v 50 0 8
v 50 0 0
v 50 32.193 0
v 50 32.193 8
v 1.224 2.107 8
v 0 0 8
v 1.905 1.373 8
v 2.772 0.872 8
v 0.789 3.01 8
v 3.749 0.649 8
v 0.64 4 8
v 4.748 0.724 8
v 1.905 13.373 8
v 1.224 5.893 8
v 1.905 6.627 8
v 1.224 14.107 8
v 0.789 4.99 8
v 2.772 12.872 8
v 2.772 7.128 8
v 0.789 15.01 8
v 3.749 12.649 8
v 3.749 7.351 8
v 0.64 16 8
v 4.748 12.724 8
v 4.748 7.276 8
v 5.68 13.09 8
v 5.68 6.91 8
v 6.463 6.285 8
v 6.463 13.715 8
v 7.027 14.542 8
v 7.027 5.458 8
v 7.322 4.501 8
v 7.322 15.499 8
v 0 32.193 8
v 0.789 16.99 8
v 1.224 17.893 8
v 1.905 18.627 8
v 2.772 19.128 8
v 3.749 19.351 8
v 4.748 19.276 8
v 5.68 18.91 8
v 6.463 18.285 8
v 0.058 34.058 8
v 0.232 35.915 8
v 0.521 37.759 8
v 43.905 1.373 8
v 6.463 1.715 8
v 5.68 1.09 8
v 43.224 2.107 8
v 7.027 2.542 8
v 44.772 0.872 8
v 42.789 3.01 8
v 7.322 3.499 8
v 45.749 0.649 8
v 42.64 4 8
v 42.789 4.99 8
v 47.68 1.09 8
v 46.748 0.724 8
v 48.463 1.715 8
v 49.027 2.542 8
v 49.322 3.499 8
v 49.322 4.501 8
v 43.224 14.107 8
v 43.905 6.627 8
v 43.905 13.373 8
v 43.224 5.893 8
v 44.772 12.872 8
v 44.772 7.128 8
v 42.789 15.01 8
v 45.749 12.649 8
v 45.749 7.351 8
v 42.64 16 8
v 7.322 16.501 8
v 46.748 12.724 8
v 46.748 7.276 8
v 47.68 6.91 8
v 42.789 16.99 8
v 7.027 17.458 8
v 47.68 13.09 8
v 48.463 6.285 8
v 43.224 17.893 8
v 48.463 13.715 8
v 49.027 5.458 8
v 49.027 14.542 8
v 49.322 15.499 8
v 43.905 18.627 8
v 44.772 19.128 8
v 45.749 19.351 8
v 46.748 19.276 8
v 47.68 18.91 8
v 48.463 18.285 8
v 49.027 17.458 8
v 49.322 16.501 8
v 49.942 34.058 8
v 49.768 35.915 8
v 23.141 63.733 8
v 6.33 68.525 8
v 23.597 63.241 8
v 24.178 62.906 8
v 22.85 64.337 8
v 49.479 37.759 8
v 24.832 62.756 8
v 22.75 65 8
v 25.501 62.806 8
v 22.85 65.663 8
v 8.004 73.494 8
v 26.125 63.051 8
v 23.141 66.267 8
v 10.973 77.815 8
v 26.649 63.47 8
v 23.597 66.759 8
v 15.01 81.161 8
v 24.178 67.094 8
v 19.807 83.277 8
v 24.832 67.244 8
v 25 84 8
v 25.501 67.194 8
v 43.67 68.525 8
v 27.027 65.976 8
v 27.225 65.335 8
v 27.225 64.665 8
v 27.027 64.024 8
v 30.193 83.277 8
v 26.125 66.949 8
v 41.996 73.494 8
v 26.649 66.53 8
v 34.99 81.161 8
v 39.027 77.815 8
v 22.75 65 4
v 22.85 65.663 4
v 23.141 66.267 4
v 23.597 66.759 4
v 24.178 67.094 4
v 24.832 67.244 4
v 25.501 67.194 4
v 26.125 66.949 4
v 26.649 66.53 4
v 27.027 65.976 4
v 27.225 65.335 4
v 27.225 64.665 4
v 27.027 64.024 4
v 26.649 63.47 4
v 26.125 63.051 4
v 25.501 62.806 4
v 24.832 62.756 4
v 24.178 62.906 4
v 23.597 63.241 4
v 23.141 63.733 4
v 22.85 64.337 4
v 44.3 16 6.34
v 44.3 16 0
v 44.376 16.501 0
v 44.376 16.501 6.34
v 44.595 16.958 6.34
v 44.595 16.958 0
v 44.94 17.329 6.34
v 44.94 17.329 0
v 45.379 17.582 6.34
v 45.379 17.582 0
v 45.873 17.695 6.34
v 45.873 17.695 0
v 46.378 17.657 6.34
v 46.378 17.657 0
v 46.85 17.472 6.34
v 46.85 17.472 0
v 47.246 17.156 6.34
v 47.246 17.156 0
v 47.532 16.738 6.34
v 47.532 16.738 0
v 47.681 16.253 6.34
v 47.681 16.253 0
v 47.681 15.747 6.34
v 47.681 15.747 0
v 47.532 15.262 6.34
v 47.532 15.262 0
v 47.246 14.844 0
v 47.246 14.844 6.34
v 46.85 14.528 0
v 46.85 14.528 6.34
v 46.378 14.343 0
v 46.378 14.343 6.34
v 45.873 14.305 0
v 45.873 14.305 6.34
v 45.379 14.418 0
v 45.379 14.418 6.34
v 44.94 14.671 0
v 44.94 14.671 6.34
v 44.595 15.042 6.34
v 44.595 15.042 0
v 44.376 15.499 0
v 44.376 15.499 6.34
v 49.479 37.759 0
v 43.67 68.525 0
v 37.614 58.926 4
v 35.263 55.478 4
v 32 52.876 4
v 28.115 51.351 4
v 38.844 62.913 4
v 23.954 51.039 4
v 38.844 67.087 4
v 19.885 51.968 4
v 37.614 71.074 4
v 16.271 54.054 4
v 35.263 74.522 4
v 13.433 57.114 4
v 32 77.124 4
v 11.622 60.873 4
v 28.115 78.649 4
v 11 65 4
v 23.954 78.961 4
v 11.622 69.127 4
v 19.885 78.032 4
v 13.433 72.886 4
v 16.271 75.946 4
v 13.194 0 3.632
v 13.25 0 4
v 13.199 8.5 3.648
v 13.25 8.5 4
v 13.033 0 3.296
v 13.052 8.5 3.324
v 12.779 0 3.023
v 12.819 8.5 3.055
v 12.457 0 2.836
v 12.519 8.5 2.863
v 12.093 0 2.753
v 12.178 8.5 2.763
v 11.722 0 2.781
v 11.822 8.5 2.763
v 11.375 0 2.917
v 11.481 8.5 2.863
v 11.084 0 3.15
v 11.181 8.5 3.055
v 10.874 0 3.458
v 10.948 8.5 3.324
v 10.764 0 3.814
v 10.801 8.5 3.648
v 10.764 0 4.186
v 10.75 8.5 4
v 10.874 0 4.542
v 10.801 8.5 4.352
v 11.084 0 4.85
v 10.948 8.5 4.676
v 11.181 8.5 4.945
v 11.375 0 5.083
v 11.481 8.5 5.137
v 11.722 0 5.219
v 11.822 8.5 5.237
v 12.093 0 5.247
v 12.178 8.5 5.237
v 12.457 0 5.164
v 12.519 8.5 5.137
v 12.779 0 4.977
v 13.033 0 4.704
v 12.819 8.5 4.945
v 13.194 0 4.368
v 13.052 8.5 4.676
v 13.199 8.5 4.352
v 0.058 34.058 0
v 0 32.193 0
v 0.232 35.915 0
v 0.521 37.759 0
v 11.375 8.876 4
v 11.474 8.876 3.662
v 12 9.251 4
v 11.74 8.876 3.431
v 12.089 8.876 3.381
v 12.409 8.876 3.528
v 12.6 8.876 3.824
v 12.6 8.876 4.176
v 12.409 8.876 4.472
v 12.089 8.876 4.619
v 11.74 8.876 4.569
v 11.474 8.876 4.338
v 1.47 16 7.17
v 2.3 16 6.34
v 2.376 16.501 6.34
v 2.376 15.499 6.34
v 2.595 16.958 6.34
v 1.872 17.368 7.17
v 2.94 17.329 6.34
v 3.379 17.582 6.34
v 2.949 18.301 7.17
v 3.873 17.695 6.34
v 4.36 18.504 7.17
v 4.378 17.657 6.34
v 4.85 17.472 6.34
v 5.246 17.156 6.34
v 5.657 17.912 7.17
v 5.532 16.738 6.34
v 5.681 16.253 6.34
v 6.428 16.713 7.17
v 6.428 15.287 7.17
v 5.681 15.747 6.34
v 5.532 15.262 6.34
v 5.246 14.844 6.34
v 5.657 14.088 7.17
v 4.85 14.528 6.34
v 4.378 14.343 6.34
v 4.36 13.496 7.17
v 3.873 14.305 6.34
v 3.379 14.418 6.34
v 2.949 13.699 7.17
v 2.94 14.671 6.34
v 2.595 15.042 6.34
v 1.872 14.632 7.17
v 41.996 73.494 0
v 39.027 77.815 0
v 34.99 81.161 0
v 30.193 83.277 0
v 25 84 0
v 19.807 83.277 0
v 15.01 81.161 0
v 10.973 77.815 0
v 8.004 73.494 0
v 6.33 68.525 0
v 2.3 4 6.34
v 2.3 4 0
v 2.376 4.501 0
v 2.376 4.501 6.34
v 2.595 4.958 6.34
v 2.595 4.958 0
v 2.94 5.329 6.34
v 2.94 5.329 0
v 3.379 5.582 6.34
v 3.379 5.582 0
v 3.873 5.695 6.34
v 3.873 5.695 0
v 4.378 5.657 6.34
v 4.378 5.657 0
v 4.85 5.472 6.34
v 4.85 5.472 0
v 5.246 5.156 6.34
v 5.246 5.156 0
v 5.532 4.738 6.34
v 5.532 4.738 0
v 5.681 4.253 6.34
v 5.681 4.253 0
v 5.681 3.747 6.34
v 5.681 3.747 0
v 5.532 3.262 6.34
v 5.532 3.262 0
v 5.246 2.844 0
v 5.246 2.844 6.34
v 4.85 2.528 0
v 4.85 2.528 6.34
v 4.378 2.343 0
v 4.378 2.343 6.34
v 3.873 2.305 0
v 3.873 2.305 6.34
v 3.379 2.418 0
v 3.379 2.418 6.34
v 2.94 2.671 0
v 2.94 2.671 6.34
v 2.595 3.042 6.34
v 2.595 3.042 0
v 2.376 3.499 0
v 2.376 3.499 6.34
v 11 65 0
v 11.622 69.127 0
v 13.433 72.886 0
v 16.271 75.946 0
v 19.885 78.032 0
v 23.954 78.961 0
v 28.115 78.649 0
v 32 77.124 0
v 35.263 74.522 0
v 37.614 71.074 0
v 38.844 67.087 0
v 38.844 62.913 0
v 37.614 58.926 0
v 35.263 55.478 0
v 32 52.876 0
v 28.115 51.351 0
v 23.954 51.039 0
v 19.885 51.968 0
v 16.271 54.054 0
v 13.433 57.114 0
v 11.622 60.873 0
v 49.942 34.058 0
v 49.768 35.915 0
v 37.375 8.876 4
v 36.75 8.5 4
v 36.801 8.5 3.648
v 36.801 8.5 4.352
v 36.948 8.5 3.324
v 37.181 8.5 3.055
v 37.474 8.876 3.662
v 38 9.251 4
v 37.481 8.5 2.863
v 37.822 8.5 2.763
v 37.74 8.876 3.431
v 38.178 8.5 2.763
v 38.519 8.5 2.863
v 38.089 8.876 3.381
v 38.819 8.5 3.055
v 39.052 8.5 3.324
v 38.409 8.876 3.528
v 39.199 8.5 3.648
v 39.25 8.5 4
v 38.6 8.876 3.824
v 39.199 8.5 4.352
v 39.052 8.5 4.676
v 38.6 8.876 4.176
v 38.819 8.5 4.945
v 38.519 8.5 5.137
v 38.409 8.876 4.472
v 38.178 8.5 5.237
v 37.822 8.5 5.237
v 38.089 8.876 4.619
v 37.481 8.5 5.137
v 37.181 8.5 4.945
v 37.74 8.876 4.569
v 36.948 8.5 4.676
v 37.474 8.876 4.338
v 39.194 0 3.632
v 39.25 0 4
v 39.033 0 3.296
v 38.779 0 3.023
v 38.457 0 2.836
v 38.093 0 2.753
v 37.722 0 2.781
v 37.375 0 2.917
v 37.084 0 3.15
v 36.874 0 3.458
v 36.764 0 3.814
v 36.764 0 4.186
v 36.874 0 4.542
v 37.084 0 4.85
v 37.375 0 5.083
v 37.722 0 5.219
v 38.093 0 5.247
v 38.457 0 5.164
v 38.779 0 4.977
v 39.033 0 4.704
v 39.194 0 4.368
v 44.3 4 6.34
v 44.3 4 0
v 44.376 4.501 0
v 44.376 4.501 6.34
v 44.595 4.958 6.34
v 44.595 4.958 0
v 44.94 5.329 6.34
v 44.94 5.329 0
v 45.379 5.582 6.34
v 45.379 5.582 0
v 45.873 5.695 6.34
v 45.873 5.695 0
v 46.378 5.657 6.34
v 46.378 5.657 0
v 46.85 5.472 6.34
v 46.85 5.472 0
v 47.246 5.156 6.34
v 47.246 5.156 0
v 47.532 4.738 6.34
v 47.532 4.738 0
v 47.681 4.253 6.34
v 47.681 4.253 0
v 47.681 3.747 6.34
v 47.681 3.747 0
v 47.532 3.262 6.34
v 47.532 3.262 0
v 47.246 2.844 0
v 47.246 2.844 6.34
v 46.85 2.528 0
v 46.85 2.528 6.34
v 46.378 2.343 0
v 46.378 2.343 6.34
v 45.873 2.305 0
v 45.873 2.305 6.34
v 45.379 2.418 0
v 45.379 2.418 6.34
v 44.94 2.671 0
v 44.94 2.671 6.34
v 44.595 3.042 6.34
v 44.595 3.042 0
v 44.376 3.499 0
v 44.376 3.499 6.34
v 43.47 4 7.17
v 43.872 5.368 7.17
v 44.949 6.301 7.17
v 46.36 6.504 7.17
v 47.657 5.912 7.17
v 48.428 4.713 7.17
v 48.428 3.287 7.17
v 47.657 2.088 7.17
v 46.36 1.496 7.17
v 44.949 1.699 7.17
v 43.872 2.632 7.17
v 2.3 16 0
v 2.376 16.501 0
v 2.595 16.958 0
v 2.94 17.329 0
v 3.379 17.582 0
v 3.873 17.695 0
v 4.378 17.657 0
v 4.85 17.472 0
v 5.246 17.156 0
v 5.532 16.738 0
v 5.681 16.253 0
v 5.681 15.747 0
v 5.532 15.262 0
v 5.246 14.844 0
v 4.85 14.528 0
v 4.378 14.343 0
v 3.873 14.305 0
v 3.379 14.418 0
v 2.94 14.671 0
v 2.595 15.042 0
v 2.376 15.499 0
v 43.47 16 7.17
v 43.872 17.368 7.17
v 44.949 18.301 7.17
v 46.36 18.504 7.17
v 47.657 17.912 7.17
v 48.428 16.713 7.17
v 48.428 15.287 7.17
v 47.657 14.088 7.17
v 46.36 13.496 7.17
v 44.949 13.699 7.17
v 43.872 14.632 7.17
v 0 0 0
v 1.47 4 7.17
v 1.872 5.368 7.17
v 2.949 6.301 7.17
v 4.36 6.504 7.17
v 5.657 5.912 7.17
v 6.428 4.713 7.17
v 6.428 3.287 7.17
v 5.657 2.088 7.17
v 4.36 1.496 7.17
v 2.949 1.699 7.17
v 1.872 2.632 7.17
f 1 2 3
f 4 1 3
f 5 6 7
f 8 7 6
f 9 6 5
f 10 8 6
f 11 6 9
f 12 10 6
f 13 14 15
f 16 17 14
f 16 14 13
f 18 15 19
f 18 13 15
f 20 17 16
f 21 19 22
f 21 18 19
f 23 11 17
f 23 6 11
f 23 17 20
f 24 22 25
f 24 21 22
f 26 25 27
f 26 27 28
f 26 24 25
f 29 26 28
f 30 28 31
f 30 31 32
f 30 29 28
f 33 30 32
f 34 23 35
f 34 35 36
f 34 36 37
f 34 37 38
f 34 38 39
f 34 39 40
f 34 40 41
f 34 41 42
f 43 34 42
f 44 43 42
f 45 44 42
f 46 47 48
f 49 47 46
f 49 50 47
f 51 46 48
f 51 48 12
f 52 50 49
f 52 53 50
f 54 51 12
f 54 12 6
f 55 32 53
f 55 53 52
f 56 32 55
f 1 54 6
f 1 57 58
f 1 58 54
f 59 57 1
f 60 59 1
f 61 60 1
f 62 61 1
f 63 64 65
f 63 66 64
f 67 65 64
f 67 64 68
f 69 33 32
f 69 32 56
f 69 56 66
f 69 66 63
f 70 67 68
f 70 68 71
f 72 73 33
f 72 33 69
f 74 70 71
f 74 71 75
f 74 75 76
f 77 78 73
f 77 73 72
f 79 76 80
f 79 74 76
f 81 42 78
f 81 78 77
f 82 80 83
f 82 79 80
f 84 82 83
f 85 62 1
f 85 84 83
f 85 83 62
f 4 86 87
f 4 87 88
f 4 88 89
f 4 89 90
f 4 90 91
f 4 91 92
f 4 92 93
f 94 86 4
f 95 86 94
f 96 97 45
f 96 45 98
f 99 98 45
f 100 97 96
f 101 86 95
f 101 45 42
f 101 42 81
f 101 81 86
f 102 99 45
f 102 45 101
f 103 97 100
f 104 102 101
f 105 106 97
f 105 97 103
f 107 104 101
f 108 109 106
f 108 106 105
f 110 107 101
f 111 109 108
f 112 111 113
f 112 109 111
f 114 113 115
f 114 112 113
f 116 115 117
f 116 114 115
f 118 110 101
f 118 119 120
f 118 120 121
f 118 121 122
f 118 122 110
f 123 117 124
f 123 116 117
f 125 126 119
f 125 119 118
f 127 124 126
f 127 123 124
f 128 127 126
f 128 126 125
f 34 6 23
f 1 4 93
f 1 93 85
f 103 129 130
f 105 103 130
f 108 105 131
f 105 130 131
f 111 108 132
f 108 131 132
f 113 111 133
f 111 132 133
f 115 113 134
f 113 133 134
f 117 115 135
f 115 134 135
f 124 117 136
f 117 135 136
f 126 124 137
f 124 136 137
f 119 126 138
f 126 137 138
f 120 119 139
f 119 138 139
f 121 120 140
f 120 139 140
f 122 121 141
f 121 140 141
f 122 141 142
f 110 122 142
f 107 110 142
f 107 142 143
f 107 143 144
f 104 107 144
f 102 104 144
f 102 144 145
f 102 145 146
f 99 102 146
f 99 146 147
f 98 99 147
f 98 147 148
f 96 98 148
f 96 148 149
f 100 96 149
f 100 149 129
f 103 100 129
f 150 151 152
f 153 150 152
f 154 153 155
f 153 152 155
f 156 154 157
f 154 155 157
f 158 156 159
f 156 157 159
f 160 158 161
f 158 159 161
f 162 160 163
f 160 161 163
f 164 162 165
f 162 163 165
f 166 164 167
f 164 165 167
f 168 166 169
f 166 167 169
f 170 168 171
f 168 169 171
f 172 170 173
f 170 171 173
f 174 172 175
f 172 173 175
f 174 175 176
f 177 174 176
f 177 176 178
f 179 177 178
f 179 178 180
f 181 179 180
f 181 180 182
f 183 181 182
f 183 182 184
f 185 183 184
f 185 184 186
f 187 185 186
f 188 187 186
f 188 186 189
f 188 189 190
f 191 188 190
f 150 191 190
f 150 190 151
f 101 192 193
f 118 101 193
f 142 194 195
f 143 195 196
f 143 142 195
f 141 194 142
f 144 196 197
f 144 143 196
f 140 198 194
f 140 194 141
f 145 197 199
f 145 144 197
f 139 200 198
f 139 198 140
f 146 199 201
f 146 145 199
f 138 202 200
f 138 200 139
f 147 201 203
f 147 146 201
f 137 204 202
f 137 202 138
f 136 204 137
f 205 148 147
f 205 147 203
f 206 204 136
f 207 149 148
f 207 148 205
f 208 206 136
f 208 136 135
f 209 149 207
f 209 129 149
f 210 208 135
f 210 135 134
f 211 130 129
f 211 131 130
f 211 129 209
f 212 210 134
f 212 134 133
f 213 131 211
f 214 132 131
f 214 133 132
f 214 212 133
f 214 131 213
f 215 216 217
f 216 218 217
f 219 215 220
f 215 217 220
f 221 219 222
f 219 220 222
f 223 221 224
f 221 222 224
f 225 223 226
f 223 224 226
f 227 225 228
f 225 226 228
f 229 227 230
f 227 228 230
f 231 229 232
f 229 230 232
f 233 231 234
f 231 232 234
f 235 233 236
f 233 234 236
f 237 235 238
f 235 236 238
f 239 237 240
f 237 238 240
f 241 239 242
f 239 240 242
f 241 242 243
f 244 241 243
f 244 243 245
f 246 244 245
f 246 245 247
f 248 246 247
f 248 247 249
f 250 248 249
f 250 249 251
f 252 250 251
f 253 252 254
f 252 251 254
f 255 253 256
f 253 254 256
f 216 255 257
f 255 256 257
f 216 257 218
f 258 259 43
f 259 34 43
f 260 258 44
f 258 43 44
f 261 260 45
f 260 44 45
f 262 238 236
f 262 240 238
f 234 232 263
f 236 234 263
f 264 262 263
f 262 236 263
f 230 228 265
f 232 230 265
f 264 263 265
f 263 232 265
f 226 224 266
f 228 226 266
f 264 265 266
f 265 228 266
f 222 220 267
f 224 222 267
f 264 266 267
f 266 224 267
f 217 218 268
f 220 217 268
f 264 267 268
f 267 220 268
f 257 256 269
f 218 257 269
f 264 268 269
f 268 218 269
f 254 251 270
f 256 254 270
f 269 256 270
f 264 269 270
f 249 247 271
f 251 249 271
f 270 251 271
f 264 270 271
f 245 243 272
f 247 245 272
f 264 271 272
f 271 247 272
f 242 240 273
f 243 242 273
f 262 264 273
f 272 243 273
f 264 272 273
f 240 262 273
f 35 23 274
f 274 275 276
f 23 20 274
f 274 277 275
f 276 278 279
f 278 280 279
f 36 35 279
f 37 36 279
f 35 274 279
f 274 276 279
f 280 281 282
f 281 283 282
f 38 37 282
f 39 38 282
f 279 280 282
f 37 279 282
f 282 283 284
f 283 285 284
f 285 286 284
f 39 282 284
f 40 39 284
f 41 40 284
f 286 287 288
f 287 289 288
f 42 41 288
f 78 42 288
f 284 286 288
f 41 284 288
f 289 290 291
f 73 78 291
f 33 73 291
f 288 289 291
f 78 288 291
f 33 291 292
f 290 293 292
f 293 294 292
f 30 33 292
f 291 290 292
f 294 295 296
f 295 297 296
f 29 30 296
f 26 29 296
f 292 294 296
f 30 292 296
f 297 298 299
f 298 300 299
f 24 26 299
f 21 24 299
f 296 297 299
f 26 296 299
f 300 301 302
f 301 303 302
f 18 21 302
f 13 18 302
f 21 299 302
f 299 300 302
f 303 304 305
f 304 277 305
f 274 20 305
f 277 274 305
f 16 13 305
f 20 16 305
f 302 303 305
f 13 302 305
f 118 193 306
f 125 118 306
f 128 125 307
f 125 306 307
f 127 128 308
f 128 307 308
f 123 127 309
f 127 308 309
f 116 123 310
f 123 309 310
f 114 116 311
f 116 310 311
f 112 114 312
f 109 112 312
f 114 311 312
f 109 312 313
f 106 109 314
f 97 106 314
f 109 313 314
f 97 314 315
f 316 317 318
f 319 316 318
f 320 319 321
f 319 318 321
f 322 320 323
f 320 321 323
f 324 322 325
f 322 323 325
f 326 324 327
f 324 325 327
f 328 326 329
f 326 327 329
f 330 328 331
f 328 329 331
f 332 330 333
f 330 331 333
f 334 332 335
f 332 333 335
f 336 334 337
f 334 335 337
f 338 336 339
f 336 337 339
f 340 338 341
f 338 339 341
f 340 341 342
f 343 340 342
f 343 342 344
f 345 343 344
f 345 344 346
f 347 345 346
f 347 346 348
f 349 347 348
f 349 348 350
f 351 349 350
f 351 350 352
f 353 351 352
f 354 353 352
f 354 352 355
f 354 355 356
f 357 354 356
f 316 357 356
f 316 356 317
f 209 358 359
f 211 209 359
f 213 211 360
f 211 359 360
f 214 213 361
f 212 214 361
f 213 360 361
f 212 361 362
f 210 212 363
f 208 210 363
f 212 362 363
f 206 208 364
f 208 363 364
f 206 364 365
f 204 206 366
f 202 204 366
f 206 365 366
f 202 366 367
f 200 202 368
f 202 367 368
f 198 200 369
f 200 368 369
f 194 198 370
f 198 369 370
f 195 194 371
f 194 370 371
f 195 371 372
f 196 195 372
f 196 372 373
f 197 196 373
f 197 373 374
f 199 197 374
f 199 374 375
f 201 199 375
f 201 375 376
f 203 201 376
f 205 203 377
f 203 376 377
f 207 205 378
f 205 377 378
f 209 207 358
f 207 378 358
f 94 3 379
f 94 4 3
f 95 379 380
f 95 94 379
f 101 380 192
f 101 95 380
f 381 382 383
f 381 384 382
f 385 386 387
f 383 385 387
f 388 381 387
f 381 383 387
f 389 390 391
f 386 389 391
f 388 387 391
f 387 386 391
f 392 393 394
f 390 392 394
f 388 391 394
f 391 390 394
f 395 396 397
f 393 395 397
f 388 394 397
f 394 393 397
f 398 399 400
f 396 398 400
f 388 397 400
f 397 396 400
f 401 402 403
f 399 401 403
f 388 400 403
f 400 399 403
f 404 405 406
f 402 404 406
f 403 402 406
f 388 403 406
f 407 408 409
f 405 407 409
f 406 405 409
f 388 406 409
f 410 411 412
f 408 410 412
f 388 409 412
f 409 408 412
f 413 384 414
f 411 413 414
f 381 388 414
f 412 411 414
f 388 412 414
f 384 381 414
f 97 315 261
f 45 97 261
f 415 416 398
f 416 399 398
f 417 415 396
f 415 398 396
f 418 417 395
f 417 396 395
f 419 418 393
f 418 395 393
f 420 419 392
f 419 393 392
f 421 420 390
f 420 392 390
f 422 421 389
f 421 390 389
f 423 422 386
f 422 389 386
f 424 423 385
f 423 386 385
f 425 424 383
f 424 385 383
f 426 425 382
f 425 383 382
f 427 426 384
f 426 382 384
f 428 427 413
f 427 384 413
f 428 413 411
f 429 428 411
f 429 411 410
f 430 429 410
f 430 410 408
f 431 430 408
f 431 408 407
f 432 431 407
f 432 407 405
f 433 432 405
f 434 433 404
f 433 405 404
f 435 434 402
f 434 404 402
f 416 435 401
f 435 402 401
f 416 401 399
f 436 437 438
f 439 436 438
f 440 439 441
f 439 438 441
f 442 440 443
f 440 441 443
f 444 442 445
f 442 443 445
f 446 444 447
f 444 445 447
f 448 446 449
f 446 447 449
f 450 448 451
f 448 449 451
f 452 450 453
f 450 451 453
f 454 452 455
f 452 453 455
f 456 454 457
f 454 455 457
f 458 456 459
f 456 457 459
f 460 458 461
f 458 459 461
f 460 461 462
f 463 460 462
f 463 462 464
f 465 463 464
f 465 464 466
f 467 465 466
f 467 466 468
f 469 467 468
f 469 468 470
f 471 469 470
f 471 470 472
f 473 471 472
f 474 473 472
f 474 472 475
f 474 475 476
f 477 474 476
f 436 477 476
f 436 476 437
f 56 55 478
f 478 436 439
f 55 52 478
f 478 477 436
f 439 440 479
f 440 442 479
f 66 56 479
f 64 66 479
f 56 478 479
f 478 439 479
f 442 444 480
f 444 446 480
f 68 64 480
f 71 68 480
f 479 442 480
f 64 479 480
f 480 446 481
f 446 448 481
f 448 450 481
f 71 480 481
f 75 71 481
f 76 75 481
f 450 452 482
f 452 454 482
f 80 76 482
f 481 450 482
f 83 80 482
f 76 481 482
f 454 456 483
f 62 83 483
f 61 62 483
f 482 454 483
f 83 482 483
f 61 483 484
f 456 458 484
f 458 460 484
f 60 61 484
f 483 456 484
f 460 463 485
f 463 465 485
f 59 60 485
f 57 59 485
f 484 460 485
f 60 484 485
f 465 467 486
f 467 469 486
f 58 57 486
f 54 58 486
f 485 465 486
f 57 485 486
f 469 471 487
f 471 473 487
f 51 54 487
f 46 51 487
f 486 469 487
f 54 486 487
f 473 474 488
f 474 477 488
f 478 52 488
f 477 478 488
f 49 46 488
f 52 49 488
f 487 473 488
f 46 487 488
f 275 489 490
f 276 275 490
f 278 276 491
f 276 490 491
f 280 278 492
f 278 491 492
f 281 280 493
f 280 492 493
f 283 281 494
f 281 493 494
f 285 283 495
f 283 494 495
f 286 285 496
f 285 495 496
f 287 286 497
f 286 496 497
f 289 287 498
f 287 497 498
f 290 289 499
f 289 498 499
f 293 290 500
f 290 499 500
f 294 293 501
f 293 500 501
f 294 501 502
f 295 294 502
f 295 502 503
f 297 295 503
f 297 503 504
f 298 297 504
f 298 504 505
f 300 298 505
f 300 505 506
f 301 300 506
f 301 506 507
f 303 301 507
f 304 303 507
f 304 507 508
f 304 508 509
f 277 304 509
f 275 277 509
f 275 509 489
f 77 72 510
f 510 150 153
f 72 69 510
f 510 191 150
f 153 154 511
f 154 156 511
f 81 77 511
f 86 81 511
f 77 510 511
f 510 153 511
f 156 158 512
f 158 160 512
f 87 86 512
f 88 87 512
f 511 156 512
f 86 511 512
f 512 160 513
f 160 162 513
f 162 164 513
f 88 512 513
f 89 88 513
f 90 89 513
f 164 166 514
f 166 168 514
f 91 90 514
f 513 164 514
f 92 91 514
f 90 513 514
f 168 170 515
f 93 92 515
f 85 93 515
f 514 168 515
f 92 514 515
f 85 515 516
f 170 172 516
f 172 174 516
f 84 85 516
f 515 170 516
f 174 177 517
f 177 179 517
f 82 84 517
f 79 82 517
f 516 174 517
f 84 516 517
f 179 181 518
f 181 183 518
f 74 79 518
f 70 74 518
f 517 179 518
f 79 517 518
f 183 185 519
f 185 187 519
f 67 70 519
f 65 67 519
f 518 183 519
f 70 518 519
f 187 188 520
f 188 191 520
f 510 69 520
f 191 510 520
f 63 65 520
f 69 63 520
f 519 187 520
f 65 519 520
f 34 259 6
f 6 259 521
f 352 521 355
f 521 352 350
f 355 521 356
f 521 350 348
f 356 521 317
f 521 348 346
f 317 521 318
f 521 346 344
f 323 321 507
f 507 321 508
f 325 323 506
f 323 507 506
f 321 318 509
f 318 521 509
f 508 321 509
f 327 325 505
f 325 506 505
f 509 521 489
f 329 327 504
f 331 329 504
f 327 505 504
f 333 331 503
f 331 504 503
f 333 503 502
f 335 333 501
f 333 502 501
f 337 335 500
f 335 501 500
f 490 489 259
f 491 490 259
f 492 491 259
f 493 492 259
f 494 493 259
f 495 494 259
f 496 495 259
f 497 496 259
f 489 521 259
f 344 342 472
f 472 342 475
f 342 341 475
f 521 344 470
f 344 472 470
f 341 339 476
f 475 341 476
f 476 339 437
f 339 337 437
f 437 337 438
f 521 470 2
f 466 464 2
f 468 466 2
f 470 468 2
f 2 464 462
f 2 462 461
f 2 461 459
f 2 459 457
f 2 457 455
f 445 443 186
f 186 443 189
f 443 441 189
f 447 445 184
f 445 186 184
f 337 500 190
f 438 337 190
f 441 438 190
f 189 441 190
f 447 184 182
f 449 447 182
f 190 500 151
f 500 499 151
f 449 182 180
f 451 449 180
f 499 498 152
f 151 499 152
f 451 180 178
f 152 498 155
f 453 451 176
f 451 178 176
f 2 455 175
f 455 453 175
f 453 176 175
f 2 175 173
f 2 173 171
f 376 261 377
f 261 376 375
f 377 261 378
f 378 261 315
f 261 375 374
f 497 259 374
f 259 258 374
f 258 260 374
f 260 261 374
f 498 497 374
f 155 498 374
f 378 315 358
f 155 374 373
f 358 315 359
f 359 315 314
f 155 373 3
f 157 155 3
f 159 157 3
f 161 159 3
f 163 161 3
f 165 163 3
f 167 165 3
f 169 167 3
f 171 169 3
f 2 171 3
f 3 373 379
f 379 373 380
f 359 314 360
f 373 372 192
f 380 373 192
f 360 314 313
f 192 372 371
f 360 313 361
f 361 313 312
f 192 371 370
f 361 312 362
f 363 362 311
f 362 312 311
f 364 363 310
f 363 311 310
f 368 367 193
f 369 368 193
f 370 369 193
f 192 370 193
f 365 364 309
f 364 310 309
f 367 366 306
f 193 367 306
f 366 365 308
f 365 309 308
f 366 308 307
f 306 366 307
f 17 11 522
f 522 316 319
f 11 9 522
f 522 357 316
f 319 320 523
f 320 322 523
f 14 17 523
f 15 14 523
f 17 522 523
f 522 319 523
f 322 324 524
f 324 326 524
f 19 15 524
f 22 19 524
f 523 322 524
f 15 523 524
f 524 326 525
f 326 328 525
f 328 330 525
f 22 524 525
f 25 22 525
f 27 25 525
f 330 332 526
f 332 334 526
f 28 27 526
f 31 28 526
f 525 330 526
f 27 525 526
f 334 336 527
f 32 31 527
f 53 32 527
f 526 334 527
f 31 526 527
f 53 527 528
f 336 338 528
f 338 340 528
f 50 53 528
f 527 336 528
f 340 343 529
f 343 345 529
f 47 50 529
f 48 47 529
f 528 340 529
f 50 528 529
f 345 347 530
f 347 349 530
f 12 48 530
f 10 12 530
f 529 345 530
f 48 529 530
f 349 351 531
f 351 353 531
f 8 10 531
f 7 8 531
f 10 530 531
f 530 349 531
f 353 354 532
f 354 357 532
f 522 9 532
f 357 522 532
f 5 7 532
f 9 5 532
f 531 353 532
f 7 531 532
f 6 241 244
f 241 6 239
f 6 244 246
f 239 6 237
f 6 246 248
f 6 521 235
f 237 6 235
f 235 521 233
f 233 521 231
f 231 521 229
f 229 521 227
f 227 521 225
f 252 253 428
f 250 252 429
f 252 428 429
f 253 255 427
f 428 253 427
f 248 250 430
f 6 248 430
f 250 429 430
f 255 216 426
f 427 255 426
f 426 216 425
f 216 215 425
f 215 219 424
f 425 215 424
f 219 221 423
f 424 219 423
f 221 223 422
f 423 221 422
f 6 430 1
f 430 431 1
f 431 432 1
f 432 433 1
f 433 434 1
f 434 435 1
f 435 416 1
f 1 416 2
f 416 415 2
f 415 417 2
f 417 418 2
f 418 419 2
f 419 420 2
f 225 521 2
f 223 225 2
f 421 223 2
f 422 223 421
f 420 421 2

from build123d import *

# Parameters (mm, degrees)
EXTRUDE_1_DEPTH              = 8
FILLET_1_R                   = 30
SKETCH_2_R                   = 14
CUT_EXTRUDE_1_DEPTH          = 4
HOLE_WIZARD_M4_1_D           = 4.5
HOLE_WIZARD_M3_1_D           = 3.4
HOLE_WIZARD_M3_1_DEPTH       = 8
HOLE_WIZARD_M3_1_CSINK_D     = 6.72
HOLE_WIZARD_M3_1_CSINK_ANGLE = 90
HOLE_WIZARD_M3_1_2_D         = 2.5
HOLE_WIZARD_M3_1_2_DEPTH     = 8.5
HOLE_WIZARD_M3_1_2_TIP       = 0.751075774


with BuildPart() as part:
    # 스케치1 → 보스-돌출1 (new body)
    with BuildSketch(Plane.XY):
        with BuildLine():
            Line((0, 35), (0, 0))
            Line((0, 0), (50, 0))
            Line((50, 0), (50, 35))
            Line((50, 35), (43.670126691, 68.525105576))
            ThreePointArc((43.670126691, 68.525105576), (25, 84), (6.329873309, 68.525105576))
            Line((6.329873309, 68.525105576), (0, 35))
        make_face()
    extrude(amount=EXTRUDE_1_DEPTH)

    # 필렛1
    fillet_1_edges = [part.edges().sort_by_distance(p)[0] for p in [
        (50, 35, 4),
        (0, 35, 4),
    ]]
    fillet(fillet_1_edges, radius=FILLET_1_R)

    # 스케치2 → 컷-돌출1 (cut)
    with BuildSketch(Plane(origin=(0, 0, 0), x_dir=(-1, 0, 0), z_dir=(0, 0, -1))):
        with Locations((-25, 65)):
            Circle(SKETCH_2_R)
    extrude(amount=-CUT_EXTRUDE_1_DEPTH, mode=Mode.SUBTRACT)

    # M4 여유 구멍1 (through all)
    with Locations(Plane.XY.offset(8)):
        with Locations((25, 65)):
            Hole(HOLE_WIZARD_M4_1_D / 2)

    # Hole Wizard M3 _ _ _ _ _ _ _1
    with Locations(Plane.XY.offset(8)):
        with Locations((4, 16), (4, 4), (46, 4), (46, 16)):
            CounterSinkHole(HOLE_WIZARD_M3_1_D / 2, HOLE_WIZARD_M3_1_CSINK_D / 2, depth=HOLE_WIZARD_M3_1_DEPTH, counter_sink_angle=HOLE_WIZARD_M3_1_CSINK_ANGLE)

    # Hole Wizard M3 _ _1 2
    with Locations(Plane(origin=(0, 0, 0), x_dir=(-1, 0, 0), z_dir=(0, -1, 0))):
        with Locations((-38, -4), (-12, -4)):
            Hole(HOLE_WIZARD_M3_1_2_D / 2, depth=HOLE_WIZARD_M3_1_2_DEPTH)
            with Locations((0, 0, -(HOLE_WIZARD_M3_1_2_DEPTH + HOLE_WIZARD_M3_1_2_TIP / 2))):  # 118° drill point
                Cone(0, HOLE_WIZARD_M3_1_2_D / 2, HOLE_WIZARD_M3_1_2_TIP, mode=Mode.SUBTRACT)


solid = part.part
